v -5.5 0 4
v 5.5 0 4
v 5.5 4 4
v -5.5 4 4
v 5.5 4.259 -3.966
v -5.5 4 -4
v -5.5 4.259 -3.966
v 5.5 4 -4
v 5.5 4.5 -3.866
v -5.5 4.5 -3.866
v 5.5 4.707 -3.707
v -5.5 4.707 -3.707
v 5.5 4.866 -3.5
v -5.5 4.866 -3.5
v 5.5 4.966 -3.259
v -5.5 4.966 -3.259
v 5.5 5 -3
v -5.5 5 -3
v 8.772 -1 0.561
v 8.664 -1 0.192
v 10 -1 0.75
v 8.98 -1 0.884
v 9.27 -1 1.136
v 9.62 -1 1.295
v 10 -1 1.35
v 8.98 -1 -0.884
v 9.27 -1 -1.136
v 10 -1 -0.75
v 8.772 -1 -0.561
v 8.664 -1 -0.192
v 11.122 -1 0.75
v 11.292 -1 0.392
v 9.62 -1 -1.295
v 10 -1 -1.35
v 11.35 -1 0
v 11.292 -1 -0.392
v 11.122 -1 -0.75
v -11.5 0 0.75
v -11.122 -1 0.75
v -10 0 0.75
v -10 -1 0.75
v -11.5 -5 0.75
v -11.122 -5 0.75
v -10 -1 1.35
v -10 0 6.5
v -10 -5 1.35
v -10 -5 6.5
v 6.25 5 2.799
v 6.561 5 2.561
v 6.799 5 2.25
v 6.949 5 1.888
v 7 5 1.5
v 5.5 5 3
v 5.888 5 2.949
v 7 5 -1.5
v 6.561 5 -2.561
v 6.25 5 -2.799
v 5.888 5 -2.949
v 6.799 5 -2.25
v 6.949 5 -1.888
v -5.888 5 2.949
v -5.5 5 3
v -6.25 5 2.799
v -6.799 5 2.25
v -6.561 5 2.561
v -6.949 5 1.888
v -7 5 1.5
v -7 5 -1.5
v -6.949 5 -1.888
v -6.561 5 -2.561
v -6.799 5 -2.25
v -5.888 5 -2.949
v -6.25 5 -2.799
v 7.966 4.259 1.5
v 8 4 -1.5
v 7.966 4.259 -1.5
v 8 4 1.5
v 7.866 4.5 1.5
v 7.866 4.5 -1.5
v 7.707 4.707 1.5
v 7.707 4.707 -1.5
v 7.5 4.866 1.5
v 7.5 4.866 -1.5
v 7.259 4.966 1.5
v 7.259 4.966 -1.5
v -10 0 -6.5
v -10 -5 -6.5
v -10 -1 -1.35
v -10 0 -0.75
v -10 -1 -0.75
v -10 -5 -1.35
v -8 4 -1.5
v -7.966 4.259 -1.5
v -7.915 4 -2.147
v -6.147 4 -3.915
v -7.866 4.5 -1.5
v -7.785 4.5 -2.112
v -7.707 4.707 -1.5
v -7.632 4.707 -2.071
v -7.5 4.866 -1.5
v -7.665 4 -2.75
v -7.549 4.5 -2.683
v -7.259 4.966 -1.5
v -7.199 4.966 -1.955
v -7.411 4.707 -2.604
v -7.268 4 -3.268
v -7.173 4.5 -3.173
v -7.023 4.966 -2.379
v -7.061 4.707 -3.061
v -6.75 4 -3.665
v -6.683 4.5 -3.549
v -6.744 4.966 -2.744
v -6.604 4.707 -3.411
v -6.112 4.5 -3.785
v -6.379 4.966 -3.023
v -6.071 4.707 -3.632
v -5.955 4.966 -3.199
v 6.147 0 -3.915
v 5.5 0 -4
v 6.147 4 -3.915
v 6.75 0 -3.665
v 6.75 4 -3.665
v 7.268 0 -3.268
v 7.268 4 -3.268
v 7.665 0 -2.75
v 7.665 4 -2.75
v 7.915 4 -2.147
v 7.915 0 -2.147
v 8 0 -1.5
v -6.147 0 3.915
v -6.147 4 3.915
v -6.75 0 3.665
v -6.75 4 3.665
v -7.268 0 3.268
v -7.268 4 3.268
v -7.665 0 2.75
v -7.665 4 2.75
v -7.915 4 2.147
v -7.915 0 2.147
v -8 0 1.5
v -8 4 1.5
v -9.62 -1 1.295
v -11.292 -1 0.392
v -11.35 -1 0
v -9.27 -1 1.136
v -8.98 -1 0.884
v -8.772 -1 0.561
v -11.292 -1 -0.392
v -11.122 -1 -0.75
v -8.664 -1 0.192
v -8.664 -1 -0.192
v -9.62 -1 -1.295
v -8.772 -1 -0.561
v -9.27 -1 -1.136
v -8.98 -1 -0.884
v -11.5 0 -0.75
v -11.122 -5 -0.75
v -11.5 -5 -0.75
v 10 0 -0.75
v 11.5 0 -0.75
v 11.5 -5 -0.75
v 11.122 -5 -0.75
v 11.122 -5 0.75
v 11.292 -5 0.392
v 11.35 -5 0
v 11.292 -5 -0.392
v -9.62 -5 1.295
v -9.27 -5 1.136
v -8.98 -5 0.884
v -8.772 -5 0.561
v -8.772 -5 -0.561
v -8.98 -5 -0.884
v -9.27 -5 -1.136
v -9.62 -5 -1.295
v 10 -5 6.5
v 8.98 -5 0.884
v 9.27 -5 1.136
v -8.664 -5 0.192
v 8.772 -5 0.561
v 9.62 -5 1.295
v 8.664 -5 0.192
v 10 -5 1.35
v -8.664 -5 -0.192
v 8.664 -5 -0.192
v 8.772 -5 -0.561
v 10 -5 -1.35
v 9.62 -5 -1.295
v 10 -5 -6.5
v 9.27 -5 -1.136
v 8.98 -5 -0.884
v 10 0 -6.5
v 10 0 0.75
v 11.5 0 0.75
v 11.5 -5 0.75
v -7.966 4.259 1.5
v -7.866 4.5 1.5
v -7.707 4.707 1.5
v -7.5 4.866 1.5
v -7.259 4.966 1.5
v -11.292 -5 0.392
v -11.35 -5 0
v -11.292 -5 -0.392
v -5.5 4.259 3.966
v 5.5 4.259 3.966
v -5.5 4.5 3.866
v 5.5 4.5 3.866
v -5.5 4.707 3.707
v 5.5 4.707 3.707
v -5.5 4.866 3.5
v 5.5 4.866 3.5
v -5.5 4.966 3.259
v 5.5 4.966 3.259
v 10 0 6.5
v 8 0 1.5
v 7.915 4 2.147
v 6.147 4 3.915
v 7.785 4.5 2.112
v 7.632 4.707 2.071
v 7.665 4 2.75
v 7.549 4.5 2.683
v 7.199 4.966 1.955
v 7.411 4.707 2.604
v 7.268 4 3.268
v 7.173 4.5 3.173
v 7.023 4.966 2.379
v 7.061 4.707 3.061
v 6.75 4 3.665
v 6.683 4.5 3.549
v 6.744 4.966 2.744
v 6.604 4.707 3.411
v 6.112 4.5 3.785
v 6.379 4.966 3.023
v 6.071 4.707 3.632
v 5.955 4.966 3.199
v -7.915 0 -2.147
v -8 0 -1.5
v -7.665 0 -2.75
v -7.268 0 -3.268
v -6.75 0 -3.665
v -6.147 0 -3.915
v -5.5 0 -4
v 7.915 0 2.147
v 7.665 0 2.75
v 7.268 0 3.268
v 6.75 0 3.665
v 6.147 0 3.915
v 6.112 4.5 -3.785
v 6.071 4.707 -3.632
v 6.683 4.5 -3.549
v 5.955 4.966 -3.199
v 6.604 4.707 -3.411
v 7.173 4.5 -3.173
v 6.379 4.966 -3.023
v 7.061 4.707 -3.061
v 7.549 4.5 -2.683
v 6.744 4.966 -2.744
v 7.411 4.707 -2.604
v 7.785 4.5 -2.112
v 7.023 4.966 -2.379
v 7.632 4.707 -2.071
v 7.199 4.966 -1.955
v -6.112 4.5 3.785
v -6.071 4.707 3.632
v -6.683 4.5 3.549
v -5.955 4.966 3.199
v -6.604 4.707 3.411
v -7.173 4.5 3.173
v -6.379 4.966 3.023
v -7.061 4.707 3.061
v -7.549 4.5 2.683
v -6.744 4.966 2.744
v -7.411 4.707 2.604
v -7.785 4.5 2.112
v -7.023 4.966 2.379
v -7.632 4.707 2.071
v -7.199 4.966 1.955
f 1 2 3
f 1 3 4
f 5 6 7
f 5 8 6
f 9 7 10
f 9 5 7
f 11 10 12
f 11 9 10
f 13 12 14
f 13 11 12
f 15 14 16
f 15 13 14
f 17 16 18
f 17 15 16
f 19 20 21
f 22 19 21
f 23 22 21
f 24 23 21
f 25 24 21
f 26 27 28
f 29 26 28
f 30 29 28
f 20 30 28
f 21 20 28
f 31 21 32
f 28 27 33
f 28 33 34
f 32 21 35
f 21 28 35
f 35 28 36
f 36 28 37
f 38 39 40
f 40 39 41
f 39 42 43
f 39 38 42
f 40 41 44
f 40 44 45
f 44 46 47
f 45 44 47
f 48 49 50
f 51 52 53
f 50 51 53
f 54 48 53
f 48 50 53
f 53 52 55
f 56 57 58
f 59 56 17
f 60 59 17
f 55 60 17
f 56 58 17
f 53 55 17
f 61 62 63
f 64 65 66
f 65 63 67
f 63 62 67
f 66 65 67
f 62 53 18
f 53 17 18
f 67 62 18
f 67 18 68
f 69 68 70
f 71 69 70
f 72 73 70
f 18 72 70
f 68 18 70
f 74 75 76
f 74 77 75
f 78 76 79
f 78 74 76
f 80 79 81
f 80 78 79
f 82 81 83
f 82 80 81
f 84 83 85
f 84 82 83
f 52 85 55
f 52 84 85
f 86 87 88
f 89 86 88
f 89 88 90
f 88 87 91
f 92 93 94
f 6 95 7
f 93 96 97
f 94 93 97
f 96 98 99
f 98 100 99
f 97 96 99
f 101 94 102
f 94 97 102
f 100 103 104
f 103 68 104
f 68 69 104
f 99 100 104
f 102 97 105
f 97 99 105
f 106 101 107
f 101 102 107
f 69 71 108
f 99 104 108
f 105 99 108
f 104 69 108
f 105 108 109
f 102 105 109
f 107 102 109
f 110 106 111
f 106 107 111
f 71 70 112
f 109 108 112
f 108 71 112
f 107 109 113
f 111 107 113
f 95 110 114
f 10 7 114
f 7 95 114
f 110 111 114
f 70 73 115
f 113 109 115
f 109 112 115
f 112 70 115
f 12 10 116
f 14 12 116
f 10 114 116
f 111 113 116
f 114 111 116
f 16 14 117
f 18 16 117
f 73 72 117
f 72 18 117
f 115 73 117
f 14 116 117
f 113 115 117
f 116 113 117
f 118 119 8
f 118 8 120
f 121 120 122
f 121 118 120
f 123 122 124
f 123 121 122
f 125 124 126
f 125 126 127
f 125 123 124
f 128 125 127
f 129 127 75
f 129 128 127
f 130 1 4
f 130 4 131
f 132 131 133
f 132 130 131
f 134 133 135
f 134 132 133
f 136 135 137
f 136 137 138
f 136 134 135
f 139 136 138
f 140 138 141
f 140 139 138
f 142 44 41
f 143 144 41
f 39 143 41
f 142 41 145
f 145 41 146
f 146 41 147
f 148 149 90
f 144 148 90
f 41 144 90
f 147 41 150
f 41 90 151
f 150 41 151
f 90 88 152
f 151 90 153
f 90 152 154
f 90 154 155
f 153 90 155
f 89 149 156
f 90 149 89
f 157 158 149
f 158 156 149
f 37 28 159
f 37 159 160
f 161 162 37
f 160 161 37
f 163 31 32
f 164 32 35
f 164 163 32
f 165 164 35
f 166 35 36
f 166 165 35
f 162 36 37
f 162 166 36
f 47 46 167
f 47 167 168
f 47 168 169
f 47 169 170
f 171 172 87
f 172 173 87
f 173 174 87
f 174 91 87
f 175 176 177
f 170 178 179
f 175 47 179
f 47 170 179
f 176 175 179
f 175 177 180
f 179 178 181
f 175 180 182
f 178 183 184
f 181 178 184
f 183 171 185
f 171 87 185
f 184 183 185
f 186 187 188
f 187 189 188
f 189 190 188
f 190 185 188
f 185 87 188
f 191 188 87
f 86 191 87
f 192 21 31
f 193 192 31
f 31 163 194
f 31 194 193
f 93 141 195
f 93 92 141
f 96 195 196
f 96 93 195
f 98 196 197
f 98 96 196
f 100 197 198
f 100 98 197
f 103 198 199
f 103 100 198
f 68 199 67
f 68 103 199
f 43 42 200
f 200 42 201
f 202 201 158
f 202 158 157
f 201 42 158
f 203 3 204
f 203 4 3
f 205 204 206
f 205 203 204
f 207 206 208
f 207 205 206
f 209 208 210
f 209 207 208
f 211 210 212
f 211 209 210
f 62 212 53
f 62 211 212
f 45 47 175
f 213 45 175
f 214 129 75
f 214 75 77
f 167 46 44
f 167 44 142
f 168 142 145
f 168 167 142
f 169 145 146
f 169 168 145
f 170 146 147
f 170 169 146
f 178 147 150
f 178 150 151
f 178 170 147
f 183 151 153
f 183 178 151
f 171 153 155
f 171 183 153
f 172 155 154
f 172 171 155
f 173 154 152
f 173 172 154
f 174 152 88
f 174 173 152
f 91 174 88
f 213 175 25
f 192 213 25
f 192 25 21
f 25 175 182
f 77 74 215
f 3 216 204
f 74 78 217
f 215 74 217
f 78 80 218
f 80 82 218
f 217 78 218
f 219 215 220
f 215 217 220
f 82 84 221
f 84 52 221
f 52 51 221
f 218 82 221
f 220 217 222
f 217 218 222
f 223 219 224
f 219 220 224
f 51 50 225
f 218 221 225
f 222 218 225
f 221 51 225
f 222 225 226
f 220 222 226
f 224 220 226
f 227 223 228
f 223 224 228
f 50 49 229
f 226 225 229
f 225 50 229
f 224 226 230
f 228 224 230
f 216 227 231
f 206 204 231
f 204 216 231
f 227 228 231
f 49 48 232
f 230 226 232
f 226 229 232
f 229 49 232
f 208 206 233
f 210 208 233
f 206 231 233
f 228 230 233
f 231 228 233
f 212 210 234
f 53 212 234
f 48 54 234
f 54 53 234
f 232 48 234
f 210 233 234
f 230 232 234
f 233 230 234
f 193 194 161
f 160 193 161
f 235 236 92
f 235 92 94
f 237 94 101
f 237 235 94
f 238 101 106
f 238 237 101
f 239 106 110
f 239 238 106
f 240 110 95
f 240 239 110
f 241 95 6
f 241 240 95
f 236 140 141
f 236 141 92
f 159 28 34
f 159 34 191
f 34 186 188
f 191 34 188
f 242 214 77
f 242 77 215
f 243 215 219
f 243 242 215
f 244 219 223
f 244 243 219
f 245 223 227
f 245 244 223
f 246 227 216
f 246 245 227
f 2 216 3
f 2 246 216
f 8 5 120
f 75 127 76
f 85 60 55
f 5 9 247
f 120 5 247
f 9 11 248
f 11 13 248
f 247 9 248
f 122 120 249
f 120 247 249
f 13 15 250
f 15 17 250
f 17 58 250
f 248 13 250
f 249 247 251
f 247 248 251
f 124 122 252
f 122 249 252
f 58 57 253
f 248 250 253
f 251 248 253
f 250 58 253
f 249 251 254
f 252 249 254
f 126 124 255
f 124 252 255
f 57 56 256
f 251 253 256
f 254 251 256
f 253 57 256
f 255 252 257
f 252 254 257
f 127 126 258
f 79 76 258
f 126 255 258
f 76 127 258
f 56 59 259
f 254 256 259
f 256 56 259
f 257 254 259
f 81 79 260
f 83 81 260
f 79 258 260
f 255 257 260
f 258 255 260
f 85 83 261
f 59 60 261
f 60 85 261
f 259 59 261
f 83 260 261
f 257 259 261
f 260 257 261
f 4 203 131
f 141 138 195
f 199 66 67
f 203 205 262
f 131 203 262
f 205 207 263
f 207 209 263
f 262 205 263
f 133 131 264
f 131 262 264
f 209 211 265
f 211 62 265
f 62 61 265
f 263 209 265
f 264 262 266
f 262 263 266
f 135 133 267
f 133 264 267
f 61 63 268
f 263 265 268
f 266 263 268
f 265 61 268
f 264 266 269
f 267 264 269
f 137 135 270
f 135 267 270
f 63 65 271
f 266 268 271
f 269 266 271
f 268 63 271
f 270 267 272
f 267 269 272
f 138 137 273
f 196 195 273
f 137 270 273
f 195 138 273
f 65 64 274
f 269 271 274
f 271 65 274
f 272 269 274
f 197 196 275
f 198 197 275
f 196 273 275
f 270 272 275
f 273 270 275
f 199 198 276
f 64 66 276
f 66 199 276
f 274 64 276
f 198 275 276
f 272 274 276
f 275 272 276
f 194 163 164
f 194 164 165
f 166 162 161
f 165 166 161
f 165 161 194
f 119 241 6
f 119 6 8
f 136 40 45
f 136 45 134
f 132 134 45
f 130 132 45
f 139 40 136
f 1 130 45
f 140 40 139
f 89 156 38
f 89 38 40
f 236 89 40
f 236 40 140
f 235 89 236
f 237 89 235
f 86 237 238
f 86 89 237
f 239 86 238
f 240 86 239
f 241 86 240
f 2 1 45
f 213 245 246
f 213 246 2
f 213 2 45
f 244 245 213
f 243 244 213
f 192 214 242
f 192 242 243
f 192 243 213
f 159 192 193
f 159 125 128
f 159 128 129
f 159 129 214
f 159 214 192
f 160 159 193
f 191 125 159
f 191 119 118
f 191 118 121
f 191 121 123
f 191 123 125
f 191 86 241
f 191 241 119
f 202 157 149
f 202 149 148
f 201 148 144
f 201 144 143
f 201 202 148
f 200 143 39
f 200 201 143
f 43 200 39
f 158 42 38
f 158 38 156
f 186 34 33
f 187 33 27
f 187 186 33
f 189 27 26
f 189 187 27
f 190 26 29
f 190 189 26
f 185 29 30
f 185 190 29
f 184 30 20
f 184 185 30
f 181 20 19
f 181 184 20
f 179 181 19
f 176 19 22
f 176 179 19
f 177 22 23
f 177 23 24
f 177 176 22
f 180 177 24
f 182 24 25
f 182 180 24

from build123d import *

# Parameters (mm, degrees)
BOSS_EXTRUDE1_DEPTH = 5
BOSS_EXTRUDE2_START = -5
SKETCH2_3_W         = 1.5
SKETCH2_3_H         = 1.5
BOSS_EXTRUDE2_DEPTH = 5
FILLET1_R           = 1
CUT_EXTRUDE1_START  = -5
SKETCH3_R           = 1.35
CUT_EXTRUDE1_DEPTH  = 4


with BuildPart() as part:
    # Sketch2 → Boss-Extrude1 (new body)
    with BuildSketch(Plane(origin=(0, 0, 0), x_dir=(1, 0, 0), z_dir=(0, 1, 0))):
        with BuildLine():
            ThreePointArc((-8, 1.5), (-7.267766953, 3.267766953), (-5.5, 4))
            Line((-5.5, 4), (5.5, 4))
            ThreePointArc((5.5, 4), (7.267766953, 3.267766953), (8, 1.5))
            Line((8, 1.5), (8, -1.5))
            ThreePointArc((8, -1.5), (7.267766953, -3.267766953), (5.5, -4))
            Line((5.5, -4), (-5.5, -4))
            ThreePointArc((-5.5, -4), (-7.267766953, -3.267766953), (-8, -1.5))
            Line((-8, -1.5), (-8, 1.5))
        make_face()
    extrude(amount=BOSS_EXTRUDE1_DEPTH)

    # Sketch2<3> → Boss-Extrude2 (add)
    # profile 1 of 4: a face of its own
    with BuildSketch(Plane(origin=(0, 0, 0), x_dir=(1, 0, 0), z_dir=(0, 1, 0)).offset(BOSS_EXTRUDE2_START)):
        Polygon((-10, 6.5), (-10, 0.75), (-10, -0.75), (-10, -6.5), (10, -6.5), (10, -0.75), (10, 0.75), (10, 6.5), align=None)
        with BuildLine():
            ThreePointArc((-8, 1.5), (-7.267766953, 3.267766953), (-5.5, 4))
            Line((-5.5, 4), (5.5, 4))
            ThreePointArc((5.5, 4), (7.267766953, 3.267766953), (8, 1.5))
            Line((8, 1.5), (8, -1.5))
            ThreePointArc((8, -1.5), (7.267766953, -3.267766953), (5.5, -4))
            Line((5.5, -4), (-5.5, -4))
            ThreePointArc((-5.5, -4), (-7.267766953, -3.267766953), (-8, -1.5))
            Line((-8, -1.5), (-8, 1.5))
        make_face(mode=Mode.SUBTRACT)
    # profile 2 of 4: a face of its own
    with BuildSketch(Plane(origin=(0, 0, 0), x_dir=(1, 0, 0), z_dir=(0, 1, 0)).offset(BOSS_EXTRUDE2_START)):
        with BuildLine():
            ThreePointArc((-8, 1.5), (-7.267766953, 3.267766953), (-5.5, 4))
            Line((-5.5, 4), (5.5, 4))
            ThreePointArc((5.5, 4), (7.267766953, 3.267766953), (8, 1.5))
            Line((8, 1.5), (8, -1.5))
            ThreePointArc((8, -1.5), (7.267766953, -3.267766953), (5.5, -4))
            Line((5.5, -4), (-5.5, -4))
            ThreePointArc((-5.5, -4), (-7.267766953, -3.267766953), (-8, -1.5))
            Line((-8, -1.5), (-8, 1.5))
        make_face()
    # profile 3 of 4: a face of its own
    with BuildSketch(Plane(origin=(0, 0, 0), x_dir=(1, 0, 0), z_dir=(0, 1, 0)).offset(BOSS_EXTRUDE2_START)):
        with Locations((10.75, 0)):
            Rectangle(SKETCH2_3_W, SKETCH2_3_H)
    # profile 4 of 4: a face of its own
    with BuildSketch(Plane(origin=(0, 0, 0), x_dir=(1, 0, 0), z_dir=(0, 1, 0)).offset(BOSS_EXTRUDE2_START)):
        with Locations((-10.75, 0)):
            Rectangle(SKETCH2_3_W, SKETCH2_3_H)
    extrude(amount=BOSS_EXTRUDE2_DEPTH)

    # Fillet1
    fillet1_edges = [part.edges().sort_by_distance(p)[0] for p in [
        (-8, 5, 0),
        (-7.267766953, 5, 3.267766953),
        (0, 5, 4),
        (7.267766953, 5, 3.267766953),
        (8, 5, 0),
        (7.267766953, 5, -3.267766953),
        (0, 5, -4),
        (-7.267766953, 5, -3.267766953),
    ]]
    fillet(fillet1_edges, radius=FILLET1_R)

    # Sketch3 → Cut-Extrude1 (cut)
    with BuildSketch(Plane(origin=(0, 0, 0), x_dir=(1, 0, 0), z_dir=(0, 1, 0)).offset(CUT_EXTRUDE1_START)):
        with Locations((10, 0)):
            Circle(SKETCH3_R)
        with Locations((-10, 0)):
            Circle(SKETCH3_R)
    extrude(amount=CUT_EXTRUDE1_DEPTH, mode=Mode.SUBTRACT)


solid = part.part
